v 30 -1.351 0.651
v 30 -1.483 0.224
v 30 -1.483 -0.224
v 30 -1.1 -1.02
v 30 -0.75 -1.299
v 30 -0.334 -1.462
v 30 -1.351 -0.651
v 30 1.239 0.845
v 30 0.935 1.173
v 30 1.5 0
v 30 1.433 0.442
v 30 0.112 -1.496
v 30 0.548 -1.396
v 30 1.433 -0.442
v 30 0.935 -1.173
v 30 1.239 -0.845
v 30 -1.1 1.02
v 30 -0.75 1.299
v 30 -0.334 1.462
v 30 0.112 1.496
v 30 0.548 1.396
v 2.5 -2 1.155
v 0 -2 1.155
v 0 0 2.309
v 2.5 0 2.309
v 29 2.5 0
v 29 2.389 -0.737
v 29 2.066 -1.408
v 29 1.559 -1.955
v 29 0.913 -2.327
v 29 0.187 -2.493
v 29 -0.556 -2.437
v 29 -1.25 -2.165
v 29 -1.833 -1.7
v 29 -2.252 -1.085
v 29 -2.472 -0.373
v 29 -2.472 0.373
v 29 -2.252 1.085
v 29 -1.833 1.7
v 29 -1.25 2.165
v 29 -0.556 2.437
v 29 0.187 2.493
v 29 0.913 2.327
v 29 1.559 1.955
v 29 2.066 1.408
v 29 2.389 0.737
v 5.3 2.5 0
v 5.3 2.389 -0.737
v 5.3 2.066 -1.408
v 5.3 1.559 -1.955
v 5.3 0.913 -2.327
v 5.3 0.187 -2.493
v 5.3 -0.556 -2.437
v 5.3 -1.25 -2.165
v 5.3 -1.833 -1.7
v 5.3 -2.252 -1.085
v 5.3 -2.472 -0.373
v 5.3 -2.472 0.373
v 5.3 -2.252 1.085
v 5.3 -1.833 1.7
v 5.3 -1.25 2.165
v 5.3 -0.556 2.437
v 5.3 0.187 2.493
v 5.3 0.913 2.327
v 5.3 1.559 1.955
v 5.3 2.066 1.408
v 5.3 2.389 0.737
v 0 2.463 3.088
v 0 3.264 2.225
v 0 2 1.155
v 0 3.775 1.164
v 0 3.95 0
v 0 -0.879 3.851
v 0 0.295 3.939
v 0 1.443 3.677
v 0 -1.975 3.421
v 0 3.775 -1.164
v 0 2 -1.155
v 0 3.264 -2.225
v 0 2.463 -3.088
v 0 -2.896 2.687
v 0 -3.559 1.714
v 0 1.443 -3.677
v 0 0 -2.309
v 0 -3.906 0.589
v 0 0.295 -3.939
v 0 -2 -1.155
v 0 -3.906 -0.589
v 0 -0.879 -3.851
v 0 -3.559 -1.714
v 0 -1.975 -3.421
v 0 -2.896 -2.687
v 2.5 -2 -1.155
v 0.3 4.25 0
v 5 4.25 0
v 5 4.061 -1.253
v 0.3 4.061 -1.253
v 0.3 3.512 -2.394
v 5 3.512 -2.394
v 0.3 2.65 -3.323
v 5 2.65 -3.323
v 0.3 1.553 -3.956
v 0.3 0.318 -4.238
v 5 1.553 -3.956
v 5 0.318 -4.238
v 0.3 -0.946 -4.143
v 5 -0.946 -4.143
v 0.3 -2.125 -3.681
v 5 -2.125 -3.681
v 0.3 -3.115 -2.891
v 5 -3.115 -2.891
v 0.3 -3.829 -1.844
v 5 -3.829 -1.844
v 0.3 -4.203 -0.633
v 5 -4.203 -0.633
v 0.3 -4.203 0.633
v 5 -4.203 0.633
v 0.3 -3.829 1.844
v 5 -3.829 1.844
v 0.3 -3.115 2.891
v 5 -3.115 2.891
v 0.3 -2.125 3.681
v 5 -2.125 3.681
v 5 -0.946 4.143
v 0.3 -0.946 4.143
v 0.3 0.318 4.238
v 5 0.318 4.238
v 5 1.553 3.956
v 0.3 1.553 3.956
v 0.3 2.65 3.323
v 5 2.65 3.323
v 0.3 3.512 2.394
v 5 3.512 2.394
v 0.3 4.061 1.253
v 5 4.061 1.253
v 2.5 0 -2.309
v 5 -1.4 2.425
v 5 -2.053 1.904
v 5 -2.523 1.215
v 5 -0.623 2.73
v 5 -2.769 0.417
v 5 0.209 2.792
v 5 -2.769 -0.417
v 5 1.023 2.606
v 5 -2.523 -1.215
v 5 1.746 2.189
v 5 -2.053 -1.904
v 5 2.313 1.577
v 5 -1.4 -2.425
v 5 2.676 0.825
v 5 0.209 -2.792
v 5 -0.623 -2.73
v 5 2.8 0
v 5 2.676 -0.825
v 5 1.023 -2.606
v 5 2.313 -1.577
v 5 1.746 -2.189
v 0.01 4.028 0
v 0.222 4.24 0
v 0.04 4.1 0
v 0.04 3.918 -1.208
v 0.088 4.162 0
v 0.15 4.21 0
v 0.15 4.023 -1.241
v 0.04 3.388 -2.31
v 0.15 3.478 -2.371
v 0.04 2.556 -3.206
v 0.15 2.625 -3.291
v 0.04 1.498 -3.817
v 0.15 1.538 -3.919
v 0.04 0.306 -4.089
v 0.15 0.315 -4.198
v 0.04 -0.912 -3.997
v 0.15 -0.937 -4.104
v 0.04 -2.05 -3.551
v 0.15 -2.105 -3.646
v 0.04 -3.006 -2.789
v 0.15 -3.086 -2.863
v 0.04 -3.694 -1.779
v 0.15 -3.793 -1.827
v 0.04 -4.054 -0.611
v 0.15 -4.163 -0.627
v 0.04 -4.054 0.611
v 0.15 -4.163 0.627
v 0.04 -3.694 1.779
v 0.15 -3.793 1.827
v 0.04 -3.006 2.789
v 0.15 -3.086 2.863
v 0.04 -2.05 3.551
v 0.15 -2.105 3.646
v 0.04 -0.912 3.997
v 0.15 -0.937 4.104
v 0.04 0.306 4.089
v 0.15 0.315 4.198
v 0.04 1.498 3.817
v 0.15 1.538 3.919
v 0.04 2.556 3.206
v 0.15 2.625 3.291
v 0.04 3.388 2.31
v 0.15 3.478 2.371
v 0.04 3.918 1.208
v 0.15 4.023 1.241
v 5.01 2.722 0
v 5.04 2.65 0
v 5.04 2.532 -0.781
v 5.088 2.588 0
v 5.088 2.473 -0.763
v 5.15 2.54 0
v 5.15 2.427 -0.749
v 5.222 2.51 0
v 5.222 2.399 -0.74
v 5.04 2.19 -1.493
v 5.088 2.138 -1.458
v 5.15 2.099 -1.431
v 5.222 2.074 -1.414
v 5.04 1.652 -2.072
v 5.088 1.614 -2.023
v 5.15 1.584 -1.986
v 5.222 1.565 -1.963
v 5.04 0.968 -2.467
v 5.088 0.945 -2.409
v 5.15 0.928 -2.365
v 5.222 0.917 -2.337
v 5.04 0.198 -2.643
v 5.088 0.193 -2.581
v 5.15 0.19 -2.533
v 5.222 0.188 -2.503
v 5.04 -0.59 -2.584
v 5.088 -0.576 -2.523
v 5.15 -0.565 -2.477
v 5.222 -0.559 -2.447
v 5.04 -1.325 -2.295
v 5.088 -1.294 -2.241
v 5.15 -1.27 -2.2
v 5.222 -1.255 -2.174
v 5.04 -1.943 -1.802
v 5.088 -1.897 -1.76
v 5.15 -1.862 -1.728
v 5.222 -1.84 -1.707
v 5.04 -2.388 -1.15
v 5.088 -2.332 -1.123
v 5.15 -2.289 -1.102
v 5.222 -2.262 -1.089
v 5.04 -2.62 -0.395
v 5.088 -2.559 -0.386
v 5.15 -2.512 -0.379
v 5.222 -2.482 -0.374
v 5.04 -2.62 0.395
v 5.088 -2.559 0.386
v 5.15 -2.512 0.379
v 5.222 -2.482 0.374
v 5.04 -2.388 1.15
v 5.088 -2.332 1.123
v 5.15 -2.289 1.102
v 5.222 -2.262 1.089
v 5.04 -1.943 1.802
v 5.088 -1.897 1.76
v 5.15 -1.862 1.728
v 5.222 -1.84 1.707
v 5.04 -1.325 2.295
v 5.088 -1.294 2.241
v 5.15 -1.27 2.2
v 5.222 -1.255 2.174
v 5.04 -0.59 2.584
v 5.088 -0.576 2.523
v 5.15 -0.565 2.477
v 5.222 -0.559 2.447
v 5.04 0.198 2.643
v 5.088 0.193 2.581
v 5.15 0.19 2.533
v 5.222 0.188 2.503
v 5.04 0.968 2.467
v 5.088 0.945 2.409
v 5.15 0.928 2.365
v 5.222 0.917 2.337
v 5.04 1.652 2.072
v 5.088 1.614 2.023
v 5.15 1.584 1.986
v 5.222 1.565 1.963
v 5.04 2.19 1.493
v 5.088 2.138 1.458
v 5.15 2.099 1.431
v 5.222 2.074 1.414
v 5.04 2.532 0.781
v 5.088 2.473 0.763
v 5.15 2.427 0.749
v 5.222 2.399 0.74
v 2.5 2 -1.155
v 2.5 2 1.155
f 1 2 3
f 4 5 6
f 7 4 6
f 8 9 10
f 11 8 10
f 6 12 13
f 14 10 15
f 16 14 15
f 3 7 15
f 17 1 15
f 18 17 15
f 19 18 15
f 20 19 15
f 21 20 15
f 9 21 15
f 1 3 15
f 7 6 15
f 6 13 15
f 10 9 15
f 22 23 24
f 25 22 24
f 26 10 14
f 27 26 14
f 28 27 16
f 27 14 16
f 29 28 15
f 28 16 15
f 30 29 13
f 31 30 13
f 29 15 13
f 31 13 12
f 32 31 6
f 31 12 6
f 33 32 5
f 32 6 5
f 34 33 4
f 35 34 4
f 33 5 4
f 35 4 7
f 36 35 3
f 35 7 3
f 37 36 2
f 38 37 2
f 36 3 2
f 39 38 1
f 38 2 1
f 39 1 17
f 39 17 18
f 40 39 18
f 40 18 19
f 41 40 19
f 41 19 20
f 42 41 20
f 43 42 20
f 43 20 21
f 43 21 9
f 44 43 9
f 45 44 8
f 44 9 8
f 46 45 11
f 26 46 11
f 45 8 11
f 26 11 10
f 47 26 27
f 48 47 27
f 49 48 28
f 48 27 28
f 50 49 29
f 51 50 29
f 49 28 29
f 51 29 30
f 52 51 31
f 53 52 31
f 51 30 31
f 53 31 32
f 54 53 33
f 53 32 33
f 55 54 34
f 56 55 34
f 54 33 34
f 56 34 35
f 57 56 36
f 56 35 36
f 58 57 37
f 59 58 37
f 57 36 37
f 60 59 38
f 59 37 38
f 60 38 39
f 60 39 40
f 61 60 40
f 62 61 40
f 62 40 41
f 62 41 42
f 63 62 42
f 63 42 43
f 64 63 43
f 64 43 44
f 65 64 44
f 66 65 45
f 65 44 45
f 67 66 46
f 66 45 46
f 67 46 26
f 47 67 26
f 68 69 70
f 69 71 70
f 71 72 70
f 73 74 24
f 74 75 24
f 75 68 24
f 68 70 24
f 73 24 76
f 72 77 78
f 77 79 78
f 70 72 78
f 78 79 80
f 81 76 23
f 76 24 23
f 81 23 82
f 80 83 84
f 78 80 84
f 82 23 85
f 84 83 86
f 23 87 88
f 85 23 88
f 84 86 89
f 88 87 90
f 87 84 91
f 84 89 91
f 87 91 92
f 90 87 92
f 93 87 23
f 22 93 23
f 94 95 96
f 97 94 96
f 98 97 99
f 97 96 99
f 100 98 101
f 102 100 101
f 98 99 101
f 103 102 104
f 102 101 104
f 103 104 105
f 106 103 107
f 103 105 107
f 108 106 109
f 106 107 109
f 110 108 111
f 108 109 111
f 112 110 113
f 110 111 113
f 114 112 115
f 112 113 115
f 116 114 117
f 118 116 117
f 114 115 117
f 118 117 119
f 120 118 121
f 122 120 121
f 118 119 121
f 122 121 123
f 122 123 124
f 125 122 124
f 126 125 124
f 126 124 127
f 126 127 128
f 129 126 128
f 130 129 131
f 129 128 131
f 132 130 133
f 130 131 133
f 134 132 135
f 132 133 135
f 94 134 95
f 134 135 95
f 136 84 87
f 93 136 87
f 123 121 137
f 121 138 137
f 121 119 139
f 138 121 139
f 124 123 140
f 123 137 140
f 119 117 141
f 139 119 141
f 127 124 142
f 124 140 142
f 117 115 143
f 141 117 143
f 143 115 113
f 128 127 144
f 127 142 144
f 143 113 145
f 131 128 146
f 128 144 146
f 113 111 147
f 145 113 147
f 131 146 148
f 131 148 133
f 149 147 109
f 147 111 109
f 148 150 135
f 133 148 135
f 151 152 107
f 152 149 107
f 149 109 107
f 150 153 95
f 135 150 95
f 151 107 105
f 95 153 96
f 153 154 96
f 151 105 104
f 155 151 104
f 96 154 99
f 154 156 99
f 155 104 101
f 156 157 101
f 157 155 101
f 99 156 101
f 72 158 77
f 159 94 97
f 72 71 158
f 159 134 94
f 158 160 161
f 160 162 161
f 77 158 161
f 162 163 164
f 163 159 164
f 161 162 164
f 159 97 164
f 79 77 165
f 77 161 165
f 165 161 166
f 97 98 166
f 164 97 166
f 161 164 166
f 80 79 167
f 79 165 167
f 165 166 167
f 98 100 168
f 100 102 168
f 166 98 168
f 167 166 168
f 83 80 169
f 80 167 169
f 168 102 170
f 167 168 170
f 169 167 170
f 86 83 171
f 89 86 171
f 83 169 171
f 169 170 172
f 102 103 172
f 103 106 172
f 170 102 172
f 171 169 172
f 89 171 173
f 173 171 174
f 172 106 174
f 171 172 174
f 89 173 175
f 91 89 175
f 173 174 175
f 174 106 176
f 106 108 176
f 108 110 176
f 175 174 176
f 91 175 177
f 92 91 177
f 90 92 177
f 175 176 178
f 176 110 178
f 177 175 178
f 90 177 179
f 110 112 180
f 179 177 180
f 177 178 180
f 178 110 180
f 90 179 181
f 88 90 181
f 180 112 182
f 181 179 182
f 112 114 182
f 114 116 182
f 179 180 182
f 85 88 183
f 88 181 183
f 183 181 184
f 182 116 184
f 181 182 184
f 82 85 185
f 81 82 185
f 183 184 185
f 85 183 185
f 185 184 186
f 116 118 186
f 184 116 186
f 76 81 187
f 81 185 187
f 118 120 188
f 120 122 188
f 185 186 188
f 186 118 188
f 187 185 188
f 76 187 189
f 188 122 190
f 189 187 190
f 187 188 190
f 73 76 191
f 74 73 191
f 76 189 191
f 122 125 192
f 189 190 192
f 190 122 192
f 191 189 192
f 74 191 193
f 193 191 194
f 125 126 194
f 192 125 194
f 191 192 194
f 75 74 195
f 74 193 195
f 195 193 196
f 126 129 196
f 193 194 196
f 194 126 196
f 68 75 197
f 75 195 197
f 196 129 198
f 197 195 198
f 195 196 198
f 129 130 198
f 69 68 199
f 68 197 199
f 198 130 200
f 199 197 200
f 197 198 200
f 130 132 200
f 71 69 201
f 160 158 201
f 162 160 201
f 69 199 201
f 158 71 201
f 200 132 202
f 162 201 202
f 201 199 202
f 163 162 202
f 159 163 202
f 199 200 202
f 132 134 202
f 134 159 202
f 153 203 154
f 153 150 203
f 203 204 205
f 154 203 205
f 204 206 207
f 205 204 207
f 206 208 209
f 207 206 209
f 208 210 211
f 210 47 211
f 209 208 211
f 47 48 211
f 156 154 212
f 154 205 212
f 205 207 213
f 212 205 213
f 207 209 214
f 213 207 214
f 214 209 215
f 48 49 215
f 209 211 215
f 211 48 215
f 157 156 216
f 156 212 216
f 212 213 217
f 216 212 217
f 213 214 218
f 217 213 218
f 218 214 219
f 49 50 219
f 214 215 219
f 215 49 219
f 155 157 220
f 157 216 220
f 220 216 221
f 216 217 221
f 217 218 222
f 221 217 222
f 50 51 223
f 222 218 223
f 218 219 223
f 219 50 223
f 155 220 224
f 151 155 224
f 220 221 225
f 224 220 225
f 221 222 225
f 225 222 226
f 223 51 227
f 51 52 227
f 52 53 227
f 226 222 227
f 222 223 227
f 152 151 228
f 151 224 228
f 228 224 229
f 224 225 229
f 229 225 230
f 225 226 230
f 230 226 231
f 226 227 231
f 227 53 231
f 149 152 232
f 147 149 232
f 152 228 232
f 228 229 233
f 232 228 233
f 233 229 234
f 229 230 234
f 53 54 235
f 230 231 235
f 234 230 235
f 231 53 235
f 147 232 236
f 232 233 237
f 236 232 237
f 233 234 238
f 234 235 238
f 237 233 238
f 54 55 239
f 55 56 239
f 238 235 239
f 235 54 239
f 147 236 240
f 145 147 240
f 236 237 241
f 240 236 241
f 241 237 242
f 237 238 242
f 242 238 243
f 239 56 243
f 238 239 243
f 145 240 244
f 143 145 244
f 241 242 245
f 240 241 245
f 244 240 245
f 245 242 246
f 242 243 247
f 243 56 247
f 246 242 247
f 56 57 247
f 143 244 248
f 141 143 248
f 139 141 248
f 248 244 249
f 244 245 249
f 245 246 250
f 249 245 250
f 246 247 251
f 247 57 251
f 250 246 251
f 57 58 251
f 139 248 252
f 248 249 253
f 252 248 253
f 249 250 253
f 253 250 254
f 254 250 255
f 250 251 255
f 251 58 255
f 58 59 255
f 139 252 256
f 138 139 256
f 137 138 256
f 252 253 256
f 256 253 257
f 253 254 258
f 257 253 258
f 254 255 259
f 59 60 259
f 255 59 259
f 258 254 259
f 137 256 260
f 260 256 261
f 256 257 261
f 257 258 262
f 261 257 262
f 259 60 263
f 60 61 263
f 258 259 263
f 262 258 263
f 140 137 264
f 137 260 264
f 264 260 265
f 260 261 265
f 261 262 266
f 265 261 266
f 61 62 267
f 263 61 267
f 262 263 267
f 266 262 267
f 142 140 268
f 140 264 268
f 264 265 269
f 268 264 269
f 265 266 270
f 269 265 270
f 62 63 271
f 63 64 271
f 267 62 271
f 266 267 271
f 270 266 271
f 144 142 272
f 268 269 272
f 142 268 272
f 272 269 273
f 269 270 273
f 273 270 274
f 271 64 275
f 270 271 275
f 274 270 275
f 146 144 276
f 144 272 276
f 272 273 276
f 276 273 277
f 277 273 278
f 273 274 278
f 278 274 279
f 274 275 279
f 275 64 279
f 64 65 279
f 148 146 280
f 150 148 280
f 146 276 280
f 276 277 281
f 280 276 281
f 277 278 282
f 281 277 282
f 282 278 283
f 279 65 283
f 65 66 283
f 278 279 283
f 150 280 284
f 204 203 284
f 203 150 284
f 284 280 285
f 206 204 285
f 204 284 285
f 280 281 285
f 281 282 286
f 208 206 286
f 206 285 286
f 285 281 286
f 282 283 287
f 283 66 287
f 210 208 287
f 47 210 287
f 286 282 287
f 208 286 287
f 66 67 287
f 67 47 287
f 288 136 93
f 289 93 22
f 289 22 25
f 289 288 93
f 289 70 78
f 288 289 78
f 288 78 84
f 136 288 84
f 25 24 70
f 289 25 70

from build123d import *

# Parameters (mm, degrees)
CUT_EXTRUDE_1_DEPTH = 2.5
FILLET_1_R          = 0.3
CHAMFER_1_SIZE      = 1


with BuildPart() as part:
    # Эскиз1 → Повернуть1 (revolve)
    with BuildSketch(Plane.XY):
        Polygon((0, 0), (0, 4.25), (5, 4.25), (5, 2.5), (30, 2.5), (30, 0), align=None)
    revolve(axis=Axis((30, 0, 0), (-1, 0, 0)))

    # Эскиз2 → Вырез-Вытянуть1 (cut)
    with BuildSketch(Plane.ZY):
        Polygon((-1.154700538, 2), (-2.309401077, 0), (-1.154700538, -2), (1.154700538, -2), (2.309401077, 0), (1.154700538, 2), align=None)
    extrude(amount=-CUT_EXTRUDE_1_DEPTH, mode=Mode.SUBTRACT)

    # Скругление1
    fillet_1_edges = [part.edges().sort_by_distance(p)[0] for p in [
        (5, -2.5, 0),
        (0, -4.25, 0),
    ]]
    fillet(fillet_1_edges, radius=FILLET_1_R)

    # Фаска1
    chamfer_1_edges = [part.edges().sort_by_distance(p)[0] for p in [
        (30, -2.5, 0),
    ]]
    chamfer(chamfer_1_edges, length=CHAMFER_1_SIZE)


solid = part.part
